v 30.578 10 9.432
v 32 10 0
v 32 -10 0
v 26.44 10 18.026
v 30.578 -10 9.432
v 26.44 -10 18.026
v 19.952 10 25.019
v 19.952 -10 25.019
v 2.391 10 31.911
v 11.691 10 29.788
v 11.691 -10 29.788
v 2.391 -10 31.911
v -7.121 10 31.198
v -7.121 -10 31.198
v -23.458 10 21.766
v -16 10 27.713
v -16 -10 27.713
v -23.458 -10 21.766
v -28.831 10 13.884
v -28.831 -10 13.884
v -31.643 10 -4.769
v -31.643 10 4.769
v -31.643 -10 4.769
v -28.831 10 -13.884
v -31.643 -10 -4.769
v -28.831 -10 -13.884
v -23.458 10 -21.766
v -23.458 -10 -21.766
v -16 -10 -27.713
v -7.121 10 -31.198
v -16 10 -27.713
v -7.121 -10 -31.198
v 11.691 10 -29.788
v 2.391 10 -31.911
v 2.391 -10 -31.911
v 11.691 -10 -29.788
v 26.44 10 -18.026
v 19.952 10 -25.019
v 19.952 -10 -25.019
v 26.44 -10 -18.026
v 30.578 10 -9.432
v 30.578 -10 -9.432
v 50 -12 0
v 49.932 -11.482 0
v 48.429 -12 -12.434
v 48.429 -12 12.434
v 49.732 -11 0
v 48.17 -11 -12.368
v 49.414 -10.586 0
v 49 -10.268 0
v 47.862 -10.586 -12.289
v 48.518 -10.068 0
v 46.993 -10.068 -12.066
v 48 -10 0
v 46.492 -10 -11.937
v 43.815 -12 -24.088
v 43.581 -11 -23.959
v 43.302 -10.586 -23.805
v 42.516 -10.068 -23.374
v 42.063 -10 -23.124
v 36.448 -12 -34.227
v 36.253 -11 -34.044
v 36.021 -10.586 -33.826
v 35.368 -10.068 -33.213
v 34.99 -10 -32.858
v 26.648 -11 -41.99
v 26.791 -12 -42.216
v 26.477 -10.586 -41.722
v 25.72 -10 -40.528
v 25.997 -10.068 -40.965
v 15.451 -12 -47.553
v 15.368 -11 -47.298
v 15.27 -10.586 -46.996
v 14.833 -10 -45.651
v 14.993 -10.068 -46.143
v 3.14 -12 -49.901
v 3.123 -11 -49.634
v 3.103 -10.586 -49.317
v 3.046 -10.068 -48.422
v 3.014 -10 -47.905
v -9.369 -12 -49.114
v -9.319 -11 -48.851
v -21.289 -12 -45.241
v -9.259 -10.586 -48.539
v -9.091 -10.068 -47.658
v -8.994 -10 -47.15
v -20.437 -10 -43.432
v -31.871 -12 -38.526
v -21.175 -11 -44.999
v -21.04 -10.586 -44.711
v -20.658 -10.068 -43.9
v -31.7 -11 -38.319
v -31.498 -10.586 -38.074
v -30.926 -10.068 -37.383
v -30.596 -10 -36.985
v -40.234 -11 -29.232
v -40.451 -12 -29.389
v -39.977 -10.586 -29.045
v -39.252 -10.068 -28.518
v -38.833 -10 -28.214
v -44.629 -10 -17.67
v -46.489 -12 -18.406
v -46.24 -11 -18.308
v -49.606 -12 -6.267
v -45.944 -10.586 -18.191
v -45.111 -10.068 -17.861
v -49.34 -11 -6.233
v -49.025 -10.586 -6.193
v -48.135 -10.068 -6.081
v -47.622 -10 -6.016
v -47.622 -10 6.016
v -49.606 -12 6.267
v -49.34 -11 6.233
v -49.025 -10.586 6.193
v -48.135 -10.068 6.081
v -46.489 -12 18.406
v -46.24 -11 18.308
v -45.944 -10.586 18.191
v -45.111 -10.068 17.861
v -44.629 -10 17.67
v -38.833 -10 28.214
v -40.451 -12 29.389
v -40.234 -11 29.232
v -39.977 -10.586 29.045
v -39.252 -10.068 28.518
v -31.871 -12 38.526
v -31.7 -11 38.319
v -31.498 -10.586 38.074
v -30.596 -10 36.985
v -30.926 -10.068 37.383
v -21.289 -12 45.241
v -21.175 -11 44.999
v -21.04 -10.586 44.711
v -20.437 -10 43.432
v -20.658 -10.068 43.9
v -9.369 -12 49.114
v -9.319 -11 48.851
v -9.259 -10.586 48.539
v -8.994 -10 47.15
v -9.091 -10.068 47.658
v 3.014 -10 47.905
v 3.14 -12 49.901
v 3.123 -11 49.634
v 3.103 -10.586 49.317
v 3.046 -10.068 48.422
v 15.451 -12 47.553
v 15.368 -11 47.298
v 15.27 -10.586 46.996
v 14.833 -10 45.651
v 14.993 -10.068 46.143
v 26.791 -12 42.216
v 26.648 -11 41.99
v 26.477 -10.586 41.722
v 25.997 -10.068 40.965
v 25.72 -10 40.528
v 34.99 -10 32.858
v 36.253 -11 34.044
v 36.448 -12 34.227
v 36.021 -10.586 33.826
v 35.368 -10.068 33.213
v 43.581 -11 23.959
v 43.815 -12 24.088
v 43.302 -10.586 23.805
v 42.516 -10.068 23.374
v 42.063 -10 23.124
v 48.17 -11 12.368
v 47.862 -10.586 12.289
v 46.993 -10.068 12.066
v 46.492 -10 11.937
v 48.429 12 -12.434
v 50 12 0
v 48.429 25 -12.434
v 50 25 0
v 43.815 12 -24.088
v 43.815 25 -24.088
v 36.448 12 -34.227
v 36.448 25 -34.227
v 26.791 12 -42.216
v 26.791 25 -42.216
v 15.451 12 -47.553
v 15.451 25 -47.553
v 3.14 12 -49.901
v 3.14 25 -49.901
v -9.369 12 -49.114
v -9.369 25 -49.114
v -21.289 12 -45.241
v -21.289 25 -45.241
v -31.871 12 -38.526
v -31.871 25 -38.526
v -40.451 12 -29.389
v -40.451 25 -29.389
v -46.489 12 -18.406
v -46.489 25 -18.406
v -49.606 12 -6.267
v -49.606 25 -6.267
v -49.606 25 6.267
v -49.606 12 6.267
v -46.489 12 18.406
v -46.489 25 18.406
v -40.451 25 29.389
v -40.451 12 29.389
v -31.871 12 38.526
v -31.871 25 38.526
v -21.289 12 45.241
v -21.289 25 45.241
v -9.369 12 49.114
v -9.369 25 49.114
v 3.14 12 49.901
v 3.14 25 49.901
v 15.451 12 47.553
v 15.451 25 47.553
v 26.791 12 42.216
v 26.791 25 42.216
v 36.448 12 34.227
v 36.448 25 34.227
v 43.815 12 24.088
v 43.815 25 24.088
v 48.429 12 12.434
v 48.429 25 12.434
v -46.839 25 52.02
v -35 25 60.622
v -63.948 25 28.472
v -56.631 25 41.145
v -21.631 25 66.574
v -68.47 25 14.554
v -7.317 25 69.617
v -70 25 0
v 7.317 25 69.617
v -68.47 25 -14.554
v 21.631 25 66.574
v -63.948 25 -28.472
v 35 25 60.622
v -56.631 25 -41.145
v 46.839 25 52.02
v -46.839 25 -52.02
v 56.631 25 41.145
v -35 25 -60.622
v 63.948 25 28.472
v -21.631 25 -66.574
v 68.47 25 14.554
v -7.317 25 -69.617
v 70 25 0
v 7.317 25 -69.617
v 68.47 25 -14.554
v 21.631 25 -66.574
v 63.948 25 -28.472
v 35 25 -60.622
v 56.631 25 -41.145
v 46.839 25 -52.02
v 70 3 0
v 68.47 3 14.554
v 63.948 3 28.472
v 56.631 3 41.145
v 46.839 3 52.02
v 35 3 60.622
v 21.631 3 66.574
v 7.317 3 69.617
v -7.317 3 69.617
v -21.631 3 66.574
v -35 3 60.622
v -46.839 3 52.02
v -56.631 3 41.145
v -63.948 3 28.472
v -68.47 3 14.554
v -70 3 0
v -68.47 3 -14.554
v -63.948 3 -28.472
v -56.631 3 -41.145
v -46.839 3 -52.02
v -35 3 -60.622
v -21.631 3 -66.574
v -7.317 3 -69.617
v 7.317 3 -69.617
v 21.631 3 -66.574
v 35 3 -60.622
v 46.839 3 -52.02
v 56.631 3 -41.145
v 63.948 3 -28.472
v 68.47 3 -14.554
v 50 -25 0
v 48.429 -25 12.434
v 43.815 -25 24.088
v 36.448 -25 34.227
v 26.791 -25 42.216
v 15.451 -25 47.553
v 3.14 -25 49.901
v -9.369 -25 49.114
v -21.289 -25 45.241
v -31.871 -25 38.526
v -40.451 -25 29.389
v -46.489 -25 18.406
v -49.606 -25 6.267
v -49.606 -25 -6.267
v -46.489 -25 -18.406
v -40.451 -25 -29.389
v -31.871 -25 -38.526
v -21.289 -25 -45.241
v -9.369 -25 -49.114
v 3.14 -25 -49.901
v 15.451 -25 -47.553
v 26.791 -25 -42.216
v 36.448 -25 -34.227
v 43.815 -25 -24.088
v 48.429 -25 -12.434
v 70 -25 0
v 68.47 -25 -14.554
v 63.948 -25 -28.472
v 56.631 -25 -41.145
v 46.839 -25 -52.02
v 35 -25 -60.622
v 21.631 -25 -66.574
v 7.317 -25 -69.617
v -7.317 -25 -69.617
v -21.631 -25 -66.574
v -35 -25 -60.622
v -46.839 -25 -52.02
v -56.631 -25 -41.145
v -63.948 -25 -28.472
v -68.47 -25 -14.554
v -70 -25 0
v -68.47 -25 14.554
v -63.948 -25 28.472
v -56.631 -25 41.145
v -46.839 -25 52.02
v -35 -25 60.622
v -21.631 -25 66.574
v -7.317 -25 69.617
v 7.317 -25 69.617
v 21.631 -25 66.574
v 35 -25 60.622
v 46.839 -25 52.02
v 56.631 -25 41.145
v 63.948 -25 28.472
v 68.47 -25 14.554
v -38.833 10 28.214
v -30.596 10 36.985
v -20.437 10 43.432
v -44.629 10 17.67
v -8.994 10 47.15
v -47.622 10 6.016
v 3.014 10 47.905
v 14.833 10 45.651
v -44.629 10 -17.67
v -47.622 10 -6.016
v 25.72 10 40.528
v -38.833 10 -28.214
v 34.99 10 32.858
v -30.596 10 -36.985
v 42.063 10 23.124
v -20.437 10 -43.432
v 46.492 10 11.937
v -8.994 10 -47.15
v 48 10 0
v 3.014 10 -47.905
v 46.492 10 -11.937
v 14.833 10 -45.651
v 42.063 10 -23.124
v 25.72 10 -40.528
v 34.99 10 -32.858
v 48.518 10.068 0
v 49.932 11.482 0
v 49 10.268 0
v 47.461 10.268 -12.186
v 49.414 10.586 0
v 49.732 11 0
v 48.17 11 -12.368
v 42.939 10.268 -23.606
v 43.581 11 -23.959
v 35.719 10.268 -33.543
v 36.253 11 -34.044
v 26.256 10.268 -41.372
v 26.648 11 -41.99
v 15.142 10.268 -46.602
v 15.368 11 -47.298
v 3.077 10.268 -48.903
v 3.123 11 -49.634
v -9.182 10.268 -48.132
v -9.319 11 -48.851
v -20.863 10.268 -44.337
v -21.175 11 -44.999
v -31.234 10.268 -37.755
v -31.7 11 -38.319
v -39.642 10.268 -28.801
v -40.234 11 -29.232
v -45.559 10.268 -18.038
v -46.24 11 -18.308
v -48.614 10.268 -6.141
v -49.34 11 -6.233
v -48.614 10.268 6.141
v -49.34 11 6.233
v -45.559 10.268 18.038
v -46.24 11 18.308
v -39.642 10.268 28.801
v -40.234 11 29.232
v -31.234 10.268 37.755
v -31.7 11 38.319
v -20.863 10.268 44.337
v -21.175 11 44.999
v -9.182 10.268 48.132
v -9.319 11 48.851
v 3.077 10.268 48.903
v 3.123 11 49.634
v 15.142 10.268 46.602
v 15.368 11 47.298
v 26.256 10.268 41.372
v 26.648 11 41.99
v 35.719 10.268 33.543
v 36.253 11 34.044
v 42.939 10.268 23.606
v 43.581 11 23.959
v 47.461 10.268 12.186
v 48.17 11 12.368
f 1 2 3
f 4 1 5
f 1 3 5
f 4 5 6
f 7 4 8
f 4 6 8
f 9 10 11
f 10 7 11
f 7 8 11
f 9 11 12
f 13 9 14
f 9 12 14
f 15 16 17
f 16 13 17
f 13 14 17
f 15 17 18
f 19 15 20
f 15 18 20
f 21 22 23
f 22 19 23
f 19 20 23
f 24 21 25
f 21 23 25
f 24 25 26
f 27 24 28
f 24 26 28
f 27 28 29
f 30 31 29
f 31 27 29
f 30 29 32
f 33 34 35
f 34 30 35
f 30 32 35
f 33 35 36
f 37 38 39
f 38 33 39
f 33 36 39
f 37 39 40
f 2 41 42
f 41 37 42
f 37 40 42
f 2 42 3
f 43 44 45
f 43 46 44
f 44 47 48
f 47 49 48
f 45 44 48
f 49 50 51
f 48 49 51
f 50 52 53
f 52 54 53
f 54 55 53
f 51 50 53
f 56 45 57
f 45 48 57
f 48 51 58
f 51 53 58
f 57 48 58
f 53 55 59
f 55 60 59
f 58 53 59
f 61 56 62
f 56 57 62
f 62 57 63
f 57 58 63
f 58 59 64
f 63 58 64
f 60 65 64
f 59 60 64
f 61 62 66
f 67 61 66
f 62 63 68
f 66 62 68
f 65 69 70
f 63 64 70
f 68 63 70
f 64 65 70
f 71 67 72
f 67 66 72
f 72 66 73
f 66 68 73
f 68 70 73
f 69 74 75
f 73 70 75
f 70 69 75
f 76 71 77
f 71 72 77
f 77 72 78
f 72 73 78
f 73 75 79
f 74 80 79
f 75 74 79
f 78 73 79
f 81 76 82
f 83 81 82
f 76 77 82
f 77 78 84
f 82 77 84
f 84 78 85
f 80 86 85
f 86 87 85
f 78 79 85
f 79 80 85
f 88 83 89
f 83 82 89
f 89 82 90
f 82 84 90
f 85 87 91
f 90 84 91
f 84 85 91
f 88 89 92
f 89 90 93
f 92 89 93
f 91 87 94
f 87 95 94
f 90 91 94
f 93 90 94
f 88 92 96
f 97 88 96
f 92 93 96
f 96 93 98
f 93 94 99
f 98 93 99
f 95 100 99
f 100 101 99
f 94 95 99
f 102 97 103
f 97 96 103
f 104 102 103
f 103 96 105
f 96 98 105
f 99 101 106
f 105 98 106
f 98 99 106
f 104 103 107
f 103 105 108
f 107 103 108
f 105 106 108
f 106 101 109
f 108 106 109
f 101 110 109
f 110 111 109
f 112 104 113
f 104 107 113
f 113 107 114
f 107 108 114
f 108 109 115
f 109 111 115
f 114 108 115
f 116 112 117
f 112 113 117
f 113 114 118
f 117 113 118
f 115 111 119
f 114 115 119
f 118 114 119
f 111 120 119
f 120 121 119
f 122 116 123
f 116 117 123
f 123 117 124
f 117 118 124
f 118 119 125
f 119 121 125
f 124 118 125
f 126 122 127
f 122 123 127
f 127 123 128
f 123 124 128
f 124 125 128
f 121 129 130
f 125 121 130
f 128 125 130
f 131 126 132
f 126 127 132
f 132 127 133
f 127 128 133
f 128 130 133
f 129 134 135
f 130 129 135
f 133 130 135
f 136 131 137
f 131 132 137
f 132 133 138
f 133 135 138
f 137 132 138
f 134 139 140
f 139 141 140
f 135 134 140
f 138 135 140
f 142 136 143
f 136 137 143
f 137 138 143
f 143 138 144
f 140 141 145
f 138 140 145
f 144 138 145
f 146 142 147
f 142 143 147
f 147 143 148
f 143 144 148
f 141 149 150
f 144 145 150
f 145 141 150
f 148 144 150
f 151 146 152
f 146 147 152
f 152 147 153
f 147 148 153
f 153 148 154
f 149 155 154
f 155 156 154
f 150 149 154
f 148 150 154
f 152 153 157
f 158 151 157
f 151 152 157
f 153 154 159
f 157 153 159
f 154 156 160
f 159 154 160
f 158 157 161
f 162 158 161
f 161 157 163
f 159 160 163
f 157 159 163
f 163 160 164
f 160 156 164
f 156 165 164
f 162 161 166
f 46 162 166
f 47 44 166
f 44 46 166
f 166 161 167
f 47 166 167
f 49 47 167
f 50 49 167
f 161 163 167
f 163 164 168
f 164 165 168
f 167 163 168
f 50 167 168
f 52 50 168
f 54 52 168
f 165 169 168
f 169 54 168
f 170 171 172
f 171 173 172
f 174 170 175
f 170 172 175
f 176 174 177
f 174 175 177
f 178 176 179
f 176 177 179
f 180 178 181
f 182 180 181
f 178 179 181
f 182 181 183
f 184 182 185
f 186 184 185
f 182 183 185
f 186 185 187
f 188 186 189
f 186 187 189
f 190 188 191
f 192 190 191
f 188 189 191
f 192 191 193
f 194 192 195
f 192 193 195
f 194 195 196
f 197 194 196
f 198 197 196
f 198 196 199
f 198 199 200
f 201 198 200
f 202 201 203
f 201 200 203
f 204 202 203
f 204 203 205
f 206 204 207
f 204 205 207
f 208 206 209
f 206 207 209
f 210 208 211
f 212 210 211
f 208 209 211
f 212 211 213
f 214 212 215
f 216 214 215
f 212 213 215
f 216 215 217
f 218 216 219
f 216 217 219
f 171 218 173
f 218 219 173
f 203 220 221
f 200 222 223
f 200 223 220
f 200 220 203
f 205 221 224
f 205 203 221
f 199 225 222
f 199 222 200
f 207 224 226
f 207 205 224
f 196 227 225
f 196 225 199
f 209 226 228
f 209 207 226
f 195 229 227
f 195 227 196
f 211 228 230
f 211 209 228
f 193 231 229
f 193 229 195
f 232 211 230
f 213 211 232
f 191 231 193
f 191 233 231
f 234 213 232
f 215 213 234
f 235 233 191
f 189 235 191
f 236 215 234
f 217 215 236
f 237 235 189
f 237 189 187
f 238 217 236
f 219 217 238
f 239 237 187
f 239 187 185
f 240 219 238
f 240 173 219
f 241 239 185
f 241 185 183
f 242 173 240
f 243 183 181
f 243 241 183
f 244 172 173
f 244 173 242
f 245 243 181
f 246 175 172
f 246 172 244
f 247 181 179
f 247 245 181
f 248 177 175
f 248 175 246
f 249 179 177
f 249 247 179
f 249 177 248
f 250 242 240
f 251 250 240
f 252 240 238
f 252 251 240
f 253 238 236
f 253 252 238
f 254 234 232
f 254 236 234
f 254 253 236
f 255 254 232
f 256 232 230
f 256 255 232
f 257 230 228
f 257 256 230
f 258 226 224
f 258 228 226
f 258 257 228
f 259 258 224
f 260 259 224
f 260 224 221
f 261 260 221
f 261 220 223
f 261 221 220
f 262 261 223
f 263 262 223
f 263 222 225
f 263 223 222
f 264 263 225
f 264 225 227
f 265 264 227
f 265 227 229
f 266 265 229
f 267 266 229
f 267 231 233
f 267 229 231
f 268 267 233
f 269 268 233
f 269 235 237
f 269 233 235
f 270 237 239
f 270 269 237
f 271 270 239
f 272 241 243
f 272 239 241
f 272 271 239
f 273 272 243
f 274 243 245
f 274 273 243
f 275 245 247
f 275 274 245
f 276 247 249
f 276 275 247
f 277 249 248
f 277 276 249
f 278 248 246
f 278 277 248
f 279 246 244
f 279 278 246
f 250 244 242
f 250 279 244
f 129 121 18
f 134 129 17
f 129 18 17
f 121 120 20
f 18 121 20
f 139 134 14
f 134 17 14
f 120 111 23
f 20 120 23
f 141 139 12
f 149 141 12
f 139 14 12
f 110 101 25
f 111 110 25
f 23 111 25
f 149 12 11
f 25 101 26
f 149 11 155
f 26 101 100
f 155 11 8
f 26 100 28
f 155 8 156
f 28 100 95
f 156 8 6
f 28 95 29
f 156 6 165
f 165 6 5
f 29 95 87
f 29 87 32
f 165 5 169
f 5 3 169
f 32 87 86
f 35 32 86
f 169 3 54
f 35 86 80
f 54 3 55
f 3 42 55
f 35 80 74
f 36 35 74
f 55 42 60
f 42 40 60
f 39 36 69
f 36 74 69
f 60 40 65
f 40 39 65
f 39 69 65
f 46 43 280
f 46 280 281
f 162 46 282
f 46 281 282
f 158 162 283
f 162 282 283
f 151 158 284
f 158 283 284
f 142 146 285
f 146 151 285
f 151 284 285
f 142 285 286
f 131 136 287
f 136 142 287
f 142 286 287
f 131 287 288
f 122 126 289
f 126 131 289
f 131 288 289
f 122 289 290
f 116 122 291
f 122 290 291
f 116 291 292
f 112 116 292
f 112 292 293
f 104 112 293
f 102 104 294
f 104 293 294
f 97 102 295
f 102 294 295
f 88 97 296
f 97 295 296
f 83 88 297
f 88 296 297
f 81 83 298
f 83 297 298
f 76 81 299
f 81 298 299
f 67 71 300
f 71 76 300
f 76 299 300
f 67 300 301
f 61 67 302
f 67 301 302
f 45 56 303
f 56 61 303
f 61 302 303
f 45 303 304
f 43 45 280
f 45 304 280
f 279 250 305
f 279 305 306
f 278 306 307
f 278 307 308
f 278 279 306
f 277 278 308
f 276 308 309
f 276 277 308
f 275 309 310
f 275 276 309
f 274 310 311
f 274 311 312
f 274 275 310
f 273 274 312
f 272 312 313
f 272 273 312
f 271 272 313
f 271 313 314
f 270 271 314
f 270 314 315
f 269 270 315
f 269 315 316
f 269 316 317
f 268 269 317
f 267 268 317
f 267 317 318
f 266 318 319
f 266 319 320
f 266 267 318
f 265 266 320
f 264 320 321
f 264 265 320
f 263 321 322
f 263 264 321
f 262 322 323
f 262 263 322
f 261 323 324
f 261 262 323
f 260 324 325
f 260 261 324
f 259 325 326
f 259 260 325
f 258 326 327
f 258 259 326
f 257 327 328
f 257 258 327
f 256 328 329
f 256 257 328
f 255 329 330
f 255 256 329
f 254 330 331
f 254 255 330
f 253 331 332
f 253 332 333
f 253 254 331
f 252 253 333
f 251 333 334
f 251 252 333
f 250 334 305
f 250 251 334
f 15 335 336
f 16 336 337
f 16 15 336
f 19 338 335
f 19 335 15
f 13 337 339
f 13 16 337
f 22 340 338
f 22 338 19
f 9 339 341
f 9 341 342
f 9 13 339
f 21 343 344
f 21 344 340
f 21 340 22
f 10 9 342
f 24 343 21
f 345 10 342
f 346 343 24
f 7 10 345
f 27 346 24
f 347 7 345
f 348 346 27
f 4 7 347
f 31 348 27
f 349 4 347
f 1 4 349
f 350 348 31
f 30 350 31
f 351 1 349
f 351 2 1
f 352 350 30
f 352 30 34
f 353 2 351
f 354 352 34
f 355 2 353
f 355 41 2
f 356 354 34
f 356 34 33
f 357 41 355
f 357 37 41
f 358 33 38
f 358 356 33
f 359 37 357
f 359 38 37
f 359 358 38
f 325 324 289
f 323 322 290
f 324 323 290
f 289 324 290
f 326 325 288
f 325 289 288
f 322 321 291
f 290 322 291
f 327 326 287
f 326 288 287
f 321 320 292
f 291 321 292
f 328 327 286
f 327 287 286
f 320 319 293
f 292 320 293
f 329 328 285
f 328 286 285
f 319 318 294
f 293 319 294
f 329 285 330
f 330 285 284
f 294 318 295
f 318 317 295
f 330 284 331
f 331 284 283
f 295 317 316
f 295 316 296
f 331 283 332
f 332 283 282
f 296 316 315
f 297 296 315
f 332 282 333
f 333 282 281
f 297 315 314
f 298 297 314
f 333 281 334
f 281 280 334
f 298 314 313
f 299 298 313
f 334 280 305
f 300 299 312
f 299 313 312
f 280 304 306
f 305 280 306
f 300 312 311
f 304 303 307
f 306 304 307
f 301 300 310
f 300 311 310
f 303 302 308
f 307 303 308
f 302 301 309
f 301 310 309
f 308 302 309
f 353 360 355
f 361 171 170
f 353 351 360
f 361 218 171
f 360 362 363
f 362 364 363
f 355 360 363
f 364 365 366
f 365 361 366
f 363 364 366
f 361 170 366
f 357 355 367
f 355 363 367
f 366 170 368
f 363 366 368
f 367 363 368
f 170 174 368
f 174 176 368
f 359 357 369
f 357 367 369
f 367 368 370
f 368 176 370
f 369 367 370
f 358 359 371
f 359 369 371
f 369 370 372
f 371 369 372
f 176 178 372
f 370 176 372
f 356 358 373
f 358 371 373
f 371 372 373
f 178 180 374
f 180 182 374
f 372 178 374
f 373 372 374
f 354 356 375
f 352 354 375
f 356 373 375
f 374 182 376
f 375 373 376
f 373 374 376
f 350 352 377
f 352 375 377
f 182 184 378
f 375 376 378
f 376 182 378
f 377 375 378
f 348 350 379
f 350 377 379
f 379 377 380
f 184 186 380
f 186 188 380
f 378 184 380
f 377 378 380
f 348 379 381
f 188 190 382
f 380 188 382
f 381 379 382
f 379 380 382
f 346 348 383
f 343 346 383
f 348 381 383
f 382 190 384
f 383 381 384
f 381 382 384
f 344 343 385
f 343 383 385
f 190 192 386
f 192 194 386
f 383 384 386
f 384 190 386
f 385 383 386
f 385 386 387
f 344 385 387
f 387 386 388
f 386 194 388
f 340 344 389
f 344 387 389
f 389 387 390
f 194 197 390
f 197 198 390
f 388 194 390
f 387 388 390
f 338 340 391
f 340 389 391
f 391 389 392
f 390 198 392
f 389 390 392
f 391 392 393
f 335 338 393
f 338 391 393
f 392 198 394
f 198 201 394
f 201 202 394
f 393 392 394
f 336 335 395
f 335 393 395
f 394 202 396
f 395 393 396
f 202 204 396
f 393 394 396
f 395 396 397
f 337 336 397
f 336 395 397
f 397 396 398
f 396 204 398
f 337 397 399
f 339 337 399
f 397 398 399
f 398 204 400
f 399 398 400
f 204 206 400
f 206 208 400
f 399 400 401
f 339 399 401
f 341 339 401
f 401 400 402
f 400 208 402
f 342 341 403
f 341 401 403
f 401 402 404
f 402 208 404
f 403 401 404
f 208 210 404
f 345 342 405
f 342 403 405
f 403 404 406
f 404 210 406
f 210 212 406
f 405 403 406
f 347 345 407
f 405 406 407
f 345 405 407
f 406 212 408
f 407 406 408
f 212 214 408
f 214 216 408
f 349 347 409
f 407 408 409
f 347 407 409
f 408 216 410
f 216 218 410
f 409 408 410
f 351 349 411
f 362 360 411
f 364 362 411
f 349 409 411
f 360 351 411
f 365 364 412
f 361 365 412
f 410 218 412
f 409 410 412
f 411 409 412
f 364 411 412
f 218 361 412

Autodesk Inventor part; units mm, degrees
ref_plane "YZ Plane" through (0, 0, 0) normal (1, 0, 0) x (0, 1, 0)
ref_plane "XZ Plane" through (0, 0, 0) normal (0, 1, 0) x (-1, 0, 0)
ref_plane "XY Plane" through (0, 0, 0) normal (0, 0, 1) x (1, 0, 0)
sketch "Эскиз1" plane through (0, 0, 0) normal (0, 0, 1) x (1, 0, 0)
  line L0 (0, 0) -> (0, 10)
  line L1 (0, 10) -> (50, 10)
  line L2 (50, 10) -> (50, 25)
  line L3 (50, 25) -> (70, 25)
  line L4 (70, 25) -> (70, 3)
  line L5 (0, 0) -> (4.3397, 0)
  line L6 (0, -10) -> (50, -10)
  line L7 (50, -10) -> (50, -25)
  line L8 (50, -25) -> (70, -25)
  line L9 (70, -25) -> (70, 3)
  line L10 (0, 10) -> (32, 10)
  line L11 (32, 10) -> (32, -10)
  dimension "d0" = 10
  dimension "d1" = 50
  dimension "d2" = 15
  dimension "d3" = 20
  dimension "d4" = 32
revolve "Вращение1" add sketch "Эскиз1" angle 360 about axis through (0, 0, 0) along (0, 1, 0)
fillet "Сопряжение1" radius 2 2 edges at (-50, 10, 0) (-50, -10, 0)
properties part number "Корпус сальника перегородка 1" material "Чугун, серый"
